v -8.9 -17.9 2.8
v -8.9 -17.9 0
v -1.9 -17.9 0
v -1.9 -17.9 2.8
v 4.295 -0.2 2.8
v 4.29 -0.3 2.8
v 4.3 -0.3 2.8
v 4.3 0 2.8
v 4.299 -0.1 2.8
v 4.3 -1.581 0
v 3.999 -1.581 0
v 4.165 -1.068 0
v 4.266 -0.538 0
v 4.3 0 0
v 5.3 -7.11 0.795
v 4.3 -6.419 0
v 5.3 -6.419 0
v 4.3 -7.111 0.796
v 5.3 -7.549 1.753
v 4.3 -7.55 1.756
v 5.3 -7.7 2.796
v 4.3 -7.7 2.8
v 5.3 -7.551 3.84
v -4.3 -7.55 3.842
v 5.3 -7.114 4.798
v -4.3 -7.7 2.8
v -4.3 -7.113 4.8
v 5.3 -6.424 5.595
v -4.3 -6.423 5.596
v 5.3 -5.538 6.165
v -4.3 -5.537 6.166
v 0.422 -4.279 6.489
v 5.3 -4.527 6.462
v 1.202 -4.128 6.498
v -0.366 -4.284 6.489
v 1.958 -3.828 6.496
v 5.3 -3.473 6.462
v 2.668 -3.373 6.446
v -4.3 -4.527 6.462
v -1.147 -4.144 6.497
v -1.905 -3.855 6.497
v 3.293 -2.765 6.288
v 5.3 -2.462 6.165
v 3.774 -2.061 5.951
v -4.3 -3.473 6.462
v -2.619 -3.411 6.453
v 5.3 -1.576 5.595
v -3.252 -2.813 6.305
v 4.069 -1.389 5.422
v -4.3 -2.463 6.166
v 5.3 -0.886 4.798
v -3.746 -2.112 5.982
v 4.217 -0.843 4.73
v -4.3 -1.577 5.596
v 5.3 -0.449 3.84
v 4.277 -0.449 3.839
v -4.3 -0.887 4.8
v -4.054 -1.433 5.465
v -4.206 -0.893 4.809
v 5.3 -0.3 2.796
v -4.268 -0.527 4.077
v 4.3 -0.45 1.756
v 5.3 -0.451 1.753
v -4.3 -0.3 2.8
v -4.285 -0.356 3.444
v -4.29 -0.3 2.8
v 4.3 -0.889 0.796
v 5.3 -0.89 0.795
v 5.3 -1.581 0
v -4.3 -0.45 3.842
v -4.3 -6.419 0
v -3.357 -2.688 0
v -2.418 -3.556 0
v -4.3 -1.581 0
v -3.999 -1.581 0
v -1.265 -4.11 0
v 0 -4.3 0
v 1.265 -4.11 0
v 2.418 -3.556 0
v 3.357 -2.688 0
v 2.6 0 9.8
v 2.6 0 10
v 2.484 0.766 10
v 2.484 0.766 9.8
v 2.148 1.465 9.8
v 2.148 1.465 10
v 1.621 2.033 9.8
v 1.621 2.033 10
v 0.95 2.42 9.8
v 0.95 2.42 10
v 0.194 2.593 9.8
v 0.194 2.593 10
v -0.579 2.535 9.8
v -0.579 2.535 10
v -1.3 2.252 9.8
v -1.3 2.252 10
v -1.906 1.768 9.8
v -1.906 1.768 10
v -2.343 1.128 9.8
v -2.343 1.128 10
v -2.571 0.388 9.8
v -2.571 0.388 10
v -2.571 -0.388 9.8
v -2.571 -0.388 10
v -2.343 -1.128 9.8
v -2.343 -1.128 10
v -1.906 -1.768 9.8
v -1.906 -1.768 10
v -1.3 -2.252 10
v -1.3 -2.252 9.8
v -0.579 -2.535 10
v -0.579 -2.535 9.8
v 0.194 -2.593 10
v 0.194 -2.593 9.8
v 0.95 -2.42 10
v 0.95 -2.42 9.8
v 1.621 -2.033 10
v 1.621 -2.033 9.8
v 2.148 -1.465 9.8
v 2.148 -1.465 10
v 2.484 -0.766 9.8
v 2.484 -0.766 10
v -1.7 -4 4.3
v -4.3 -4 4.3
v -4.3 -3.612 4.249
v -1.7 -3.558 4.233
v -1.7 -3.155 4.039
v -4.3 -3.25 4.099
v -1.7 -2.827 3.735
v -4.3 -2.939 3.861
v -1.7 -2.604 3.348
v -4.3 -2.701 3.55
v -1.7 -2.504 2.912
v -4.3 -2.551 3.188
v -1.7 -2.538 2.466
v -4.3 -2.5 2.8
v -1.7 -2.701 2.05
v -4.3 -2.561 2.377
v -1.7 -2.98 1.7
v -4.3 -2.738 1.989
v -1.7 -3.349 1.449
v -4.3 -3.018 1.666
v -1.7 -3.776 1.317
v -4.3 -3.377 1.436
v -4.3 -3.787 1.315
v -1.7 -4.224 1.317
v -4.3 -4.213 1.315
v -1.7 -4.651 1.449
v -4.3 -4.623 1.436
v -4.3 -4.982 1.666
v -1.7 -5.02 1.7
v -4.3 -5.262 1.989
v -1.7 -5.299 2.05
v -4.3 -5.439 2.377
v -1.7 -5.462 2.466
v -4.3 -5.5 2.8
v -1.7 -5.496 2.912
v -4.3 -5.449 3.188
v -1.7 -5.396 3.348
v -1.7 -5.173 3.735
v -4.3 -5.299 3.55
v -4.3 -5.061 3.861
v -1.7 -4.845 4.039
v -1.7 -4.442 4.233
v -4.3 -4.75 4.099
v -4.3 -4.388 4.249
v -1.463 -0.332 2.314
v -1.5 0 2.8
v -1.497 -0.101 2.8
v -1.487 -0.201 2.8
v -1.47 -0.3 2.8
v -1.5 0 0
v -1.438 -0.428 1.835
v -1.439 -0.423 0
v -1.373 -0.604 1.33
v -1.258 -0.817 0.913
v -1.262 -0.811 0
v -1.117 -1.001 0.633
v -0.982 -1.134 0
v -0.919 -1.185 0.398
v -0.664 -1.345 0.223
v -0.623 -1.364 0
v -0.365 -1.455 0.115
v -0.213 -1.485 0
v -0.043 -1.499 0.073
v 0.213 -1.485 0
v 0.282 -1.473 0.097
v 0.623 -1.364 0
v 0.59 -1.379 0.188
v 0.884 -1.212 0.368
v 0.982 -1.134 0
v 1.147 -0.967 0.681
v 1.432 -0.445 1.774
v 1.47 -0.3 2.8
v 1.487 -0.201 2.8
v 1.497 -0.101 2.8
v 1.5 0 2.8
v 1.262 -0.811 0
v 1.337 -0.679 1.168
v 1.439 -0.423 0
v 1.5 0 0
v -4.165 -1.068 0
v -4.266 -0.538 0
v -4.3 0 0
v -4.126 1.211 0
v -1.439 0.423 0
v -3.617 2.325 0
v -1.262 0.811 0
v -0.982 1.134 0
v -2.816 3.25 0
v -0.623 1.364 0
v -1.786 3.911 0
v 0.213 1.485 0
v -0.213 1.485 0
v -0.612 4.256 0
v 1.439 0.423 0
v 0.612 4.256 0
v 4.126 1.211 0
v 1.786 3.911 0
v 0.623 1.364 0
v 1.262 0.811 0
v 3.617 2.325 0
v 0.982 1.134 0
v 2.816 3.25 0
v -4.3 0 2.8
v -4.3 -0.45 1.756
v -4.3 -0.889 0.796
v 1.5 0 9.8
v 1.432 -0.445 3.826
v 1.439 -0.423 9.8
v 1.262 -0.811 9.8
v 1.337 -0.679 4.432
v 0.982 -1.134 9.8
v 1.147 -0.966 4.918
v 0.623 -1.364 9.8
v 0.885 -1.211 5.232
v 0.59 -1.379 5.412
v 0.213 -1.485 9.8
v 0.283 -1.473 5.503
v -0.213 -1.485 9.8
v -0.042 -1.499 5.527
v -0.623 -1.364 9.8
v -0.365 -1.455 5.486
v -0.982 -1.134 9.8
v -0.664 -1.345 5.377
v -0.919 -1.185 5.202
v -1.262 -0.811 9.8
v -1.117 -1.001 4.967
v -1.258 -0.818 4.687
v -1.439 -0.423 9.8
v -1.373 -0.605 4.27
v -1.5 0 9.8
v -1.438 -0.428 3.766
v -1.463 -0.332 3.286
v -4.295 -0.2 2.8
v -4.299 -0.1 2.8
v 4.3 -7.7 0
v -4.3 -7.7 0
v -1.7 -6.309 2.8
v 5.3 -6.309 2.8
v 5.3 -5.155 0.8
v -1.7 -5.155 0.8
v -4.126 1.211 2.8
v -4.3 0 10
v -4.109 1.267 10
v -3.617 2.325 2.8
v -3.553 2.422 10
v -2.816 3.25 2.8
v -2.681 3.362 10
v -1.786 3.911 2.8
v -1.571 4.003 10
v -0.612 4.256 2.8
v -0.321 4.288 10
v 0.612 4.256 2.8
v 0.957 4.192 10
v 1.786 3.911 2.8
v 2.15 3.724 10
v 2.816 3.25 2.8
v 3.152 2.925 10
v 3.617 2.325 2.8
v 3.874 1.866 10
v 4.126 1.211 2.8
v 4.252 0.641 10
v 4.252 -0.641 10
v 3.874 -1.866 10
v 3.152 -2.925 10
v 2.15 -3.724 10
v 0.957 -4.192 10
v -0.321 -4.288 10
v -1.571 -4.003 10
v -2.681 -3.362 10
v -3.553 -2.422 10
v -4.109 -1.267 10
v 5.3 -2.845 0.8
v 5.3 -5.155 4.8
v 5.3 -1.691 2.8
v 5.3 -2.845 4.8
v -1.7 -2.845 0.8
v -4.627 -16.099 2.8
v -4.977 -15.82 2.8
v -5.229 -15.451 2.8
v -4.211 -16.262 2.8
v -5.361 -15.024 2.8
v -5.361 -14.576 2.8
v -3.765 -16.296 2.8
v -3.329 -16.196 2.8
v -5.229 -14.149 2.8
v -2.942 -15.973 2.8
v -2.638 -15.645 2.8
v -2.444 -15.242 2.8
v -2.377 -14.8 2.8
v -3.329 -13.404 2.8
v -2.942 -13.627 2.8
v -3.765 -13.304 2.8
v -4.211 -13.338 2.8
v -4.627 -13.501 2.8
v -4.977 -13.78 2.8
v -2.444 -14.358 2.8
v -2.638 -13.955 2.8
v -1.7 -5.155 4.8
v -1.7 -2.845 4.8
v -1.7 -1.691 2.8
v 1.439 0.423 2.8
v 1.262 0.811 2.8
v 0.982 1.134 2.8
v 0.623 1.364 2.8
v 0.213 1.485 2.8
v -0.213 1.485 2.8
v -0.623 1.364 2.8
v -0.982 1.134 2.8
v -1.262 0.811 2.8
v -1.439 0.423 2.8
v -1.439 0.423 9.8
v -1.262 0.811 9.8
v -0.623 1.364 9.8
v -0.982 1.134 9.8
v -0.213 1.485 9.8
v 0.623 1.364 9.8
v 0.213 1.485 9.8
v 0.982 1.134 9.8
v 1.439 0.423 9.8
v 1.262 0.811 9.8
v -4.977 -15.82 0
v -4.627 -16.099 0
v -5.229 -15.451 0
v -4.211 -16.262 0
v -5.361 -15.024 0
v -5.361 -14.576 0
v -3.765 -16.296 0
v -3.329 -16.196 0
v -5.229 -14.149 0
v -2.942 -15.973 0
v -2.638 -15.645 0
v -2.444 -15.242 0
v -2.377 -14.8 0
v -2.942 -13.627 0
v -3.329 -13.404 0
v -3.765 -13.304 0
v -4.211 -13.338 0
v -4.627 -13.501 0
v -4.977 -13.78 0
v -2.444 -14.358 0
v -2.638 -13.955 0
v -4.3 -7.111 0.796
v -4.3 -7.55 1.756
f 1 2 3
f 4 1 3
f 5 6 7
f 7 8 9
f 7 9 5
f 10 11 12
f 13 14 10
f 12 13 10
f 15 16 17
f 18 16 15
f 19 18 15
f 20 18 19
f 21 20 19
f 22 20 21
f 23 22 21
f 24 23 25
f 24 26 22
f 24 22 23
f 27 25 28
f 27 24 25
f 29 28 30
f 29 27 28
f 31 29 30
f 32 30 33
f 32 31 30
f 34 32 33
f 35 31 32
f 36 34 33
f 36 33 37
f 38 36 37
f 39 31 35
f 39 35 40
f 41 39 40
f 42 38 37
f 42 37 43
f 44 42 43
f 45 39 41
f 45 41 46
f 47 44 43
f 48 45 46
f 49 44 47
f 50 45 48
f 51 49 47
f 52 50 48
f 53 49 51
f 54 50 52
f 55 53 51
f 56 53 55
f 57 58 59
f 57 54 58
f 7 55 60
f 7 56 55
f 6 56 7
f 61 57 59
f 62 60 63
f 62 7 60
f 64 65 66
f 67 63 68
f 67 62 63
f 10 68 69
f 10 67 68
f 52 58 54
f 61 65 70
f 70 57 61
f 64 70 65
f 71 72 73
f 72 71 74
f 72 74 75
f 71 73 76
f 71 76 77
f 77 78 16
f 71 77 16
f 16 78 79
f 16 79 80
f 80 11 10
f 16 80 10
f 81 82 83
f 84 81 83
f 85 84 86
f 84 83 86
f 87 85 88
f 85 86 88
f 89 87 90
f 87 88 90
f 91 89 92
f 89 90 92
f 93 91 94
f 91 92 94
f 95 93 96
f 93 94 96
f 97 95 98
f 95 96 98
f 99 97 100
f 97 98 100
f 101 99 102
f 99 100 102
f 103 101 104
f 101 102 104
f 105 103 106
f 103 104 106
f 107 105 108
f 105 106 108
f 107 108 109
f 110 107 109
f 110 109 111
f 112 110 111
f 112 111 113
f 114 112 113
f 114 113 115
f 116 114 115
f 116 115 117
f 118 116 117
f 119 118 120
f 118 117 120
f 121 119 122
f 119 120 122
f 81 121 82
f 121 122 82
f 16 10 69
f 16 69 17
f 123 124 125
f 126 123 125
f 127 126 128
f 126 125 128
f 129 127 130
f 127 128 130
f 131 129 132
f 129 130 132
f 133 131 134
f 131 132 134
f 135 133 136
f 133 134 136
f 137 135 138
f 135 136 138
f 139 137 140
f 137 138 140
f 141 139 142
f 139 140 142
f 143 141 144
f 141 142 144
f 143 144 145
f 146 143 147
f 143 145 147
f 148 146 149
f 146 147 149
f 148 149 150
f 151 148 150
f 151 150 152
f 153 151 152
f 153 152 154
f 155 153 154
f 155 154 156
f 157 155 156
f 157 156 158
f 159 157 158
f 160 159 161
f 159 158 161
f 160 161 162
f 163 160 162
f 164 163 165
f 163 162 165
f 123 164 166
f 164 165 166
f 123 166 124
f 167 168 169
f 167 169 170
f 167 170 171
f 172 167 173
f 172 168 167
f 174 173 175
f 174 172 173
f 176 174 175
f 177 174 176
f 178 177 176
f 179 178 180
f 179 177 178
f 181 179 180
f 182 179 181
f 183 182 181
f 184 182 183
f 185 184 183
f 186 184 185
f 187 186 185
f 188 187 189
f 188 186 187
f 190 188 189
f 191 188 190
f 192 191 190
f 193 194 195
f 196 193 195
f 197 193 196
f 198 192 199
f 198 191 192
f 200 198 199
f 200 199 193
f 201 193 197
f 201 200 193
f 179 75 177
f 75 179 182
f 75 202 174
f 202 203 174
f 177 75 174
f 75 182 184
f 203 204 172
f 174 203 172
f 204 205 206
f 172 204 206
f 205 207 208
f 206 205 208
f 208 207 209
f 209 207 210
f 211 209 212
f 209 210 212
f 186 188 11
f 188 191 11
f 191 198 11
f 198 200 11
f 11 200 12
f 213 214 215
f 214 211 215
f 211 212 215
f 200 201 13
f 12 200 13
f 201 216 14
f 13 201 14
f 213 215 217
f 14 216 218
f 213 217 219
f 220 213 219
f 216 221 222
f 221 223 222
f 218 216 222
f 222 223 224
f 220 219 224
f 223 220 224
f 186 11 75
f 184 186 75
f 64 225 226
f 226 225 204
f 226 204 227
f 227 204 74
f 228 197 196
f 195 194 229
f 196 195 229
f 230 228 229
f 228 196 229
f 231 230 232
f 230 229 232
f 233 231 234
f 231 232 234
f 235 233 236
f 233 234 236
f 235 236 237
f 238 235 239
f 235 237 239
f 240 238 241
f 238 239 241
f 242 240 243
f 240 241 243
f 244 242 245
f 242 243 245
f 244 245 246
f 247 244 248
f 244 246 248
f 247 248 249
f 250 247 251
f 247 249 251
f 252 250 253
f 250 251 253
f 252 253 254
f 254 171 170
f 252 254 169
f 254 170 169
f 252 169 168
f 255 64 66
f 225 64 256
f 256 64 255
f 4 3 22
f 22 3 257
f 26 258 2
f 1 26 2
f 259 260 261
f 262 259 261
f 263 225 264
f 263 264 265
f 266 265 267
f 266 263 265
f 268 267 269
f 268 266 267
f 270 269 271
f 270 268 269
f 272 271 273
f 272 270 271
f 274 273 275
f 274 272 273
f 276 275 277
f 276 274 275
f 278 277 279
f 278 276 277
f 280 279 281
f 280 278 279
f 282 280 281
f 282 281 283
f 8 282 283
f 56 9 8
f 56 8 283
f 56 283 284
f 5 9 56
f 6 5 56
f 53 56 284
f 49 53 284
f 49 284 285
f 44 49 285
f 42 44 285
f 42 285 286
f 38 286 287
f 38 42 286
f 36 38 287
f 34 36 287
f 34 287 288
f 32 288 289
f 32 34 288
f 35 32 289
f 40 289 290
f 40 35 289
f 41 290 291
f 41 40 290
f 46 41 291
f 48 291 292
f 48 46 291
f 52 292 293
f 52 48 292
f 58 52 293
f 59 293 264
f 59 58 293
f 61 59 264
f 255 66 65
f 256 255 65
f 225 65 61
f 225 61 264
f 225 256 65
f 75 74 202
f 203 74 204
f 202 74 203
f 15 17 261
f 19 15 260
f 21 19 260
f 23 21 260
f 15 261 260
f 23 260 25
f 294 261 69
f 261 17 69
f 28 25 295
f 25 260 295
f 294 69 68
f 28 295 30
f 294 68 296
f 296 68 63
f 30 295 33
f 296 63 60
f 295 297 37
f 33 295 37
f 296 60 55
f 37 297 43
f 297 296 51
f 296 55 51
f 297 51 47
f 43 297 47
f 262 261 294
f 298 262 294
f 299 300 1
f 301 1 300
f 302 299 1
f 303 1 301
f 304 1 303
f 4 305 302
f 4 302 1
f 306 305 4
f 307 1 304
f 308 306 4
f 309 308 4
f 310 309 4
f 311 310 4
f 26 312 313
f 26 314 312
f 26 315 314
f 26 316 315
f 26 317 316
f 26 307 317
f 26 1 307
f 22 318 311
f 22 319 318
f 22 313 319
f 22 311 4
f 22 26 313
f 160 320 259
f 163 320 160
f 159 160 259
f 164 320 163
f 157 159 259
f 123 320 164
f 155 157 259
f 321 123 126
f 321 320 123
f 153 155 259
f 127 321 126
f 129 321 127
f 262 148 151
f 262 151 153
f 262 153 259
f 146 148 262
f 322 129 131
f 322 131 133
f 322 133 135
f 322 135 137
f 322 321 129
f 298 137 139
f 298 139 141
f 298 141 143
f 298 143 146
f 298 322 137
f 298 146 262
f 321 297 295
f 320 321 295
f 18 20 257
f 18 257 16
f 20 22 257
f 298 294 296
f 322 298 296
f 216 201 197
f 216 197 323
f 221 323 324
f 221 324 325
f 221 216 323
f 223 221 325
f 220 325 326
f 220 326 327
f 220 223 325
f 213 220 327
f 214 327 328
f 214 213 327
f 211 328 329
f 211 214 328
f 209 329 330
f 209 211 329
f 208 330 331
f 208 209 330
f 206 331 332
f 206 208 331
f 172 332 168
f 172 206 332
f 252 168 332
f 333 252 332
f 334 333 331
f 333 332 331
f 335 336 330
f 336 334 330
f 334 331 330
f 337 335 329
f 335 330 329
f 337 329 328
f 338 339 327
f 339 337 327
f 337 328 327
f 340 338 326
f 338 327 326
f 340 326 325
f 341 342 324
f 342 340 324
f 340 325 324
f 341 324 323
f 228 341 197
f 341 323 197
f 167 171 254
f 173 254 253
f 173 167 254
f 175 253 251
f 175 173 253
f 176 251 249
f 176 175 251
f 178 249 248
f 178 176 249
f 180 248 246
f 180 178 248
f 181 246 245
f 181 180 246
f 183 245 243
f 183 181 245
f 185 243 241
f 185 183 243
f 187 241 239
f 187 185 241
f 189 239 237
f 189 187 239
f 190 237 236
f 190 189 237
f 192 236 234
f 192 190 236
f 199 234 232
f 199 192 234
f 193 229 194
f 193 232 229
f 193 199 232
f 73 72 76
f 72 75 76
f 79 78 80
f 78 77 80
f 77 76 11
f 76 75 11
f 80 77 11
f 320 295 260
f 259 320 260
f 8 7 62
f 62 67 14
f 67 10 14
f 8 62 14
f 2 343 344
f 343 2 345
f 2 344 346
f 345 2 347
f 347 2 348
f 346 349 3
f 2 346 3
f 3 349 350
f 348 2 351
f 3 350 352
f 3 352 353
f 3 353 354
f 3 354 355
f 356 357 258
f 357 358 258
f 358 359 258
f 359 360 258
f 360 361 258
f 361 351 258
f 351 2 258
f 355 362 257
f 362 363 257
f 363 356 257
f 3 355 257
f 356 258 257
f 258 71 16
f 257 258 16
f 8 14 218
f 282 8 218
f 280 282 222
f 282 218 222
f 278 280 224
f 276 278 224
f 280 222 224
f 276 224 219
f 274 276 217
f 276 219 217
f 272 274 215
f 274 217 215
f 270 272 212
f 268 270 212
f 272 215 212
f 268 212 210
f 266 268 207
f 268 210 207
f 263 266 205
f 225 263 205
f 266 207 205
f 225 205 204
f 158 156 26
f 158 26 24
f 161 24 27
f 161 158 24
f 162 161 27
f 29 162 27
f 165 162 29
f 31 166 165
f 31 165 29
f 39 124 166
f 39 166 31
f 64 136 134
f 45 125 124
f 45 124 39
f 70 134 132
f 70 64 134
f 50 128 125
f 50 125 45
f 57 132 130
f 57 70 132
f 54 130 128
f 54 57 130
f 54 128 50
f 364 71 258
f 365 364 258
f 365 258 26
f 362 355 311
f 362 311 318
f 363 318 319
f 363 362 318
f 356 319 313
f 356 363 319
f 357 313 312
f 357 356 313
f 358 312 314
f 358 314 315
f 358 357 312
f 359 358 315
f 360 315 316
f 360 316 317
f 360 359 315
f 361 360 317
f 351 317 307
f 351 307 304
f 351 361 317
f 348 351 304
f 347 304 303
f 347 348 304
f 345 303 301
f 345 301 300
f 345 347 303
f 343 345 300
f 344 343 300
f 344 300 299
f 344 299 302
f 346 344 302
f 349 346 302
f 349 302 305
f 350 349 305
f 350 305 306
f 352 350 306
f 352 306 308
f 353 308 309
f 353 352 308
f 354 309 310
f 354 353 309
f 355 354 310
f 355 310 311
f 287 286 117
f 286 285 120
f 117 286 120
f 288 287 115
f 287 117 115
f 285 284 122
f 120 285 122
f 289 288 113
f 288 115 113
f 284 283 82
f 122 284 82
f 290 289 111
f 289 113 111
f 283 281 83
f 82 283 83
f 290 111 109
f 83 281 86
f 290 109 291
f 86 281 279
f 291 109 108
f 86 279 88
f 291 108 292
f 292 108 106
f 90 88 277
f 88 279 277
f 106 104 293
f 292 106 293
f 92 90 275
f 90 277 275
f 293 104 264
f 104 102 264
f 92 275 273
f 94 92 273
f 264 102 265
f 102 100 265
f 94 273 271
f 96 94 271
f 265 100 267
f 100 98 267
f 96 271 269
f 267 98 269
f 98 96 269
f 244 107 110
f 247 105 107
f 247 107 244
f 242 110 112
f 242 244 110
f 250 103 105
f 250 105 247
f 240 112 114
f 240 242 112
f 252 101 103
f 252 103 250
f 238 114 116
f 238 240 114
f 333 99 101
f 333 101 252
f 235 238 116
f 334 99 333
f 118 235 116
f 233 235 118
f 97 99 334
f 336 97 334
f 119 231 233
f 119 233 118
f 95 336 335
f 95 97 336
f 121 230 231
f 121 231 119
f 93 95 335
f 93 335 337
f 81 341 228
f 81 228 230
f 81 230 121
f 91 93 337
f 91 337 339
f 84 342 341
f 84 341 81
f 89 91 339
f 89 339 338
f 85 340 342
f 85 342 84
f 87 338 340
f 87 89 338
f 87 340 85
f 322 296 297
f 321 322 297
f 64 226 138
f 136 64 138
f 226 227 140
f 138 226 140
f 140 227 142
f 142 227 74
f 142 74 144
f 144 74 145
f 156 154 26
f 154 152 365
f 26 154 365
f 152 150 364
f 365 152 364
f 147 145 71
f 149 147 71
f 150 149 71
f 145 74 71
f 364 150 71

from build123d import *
from build123d.topology import SkipClean

# Parameters (mm, degrees)
SKETCH_1_R          = 1.5
EXTRUDE_1_DEPTH     = 2.8
SKETCH_3_R          = 4.3
SKETCH_3_R_2        = 1.5
EXTRUDE_4_DEPTH     = 10
CUT_EXTRUDE_START   = -0.2
SKETCH_4_R          = 2.6
SKETCH_4_R_2        = 1.5
CUT_EXTRUDE_1_DEPTH = 0.2
EXTRUDE_8_DEPTH     = 9.6
CUT_EXTRUDE_2_DEPTH = 7
SKETCH_19_R         = 1.5
CUT_EXTRUDE_3_DEPTH = 23.64000892
SKETCH_1_4_R        = 1.5
CUT_EXTRUDE_4_DEPTH = 23.352181146


with BuildPart() as part:
    # 草图1 → 凸台-拉伸1 (new body)
    with BuildSketch(Plane.XY):
        with BuildLine():
            Line((4.3, -7.7), (4.3, 0))
            ThreePointArc((4.3, 0), (0, 4.3), (-4.3, 0))
            Line((-4.3, 0), (-4.3, -7.7))
            Line((-4.3, -7.7), (-8.9, -17.9))
            Line((-8.9, -17.9), (-1.9, -17.9))
            Line((-1.9, -17.9), (4.3, -7.7))
        make_face()
        Circle(SKETCH_1_R, mode=Mode.SUBTRACT)
        with Locations((-3.877494661, -14.8)):
            Circle(SKETCH_1_R, mode=Mode.SUBTRACT)
    extrude(amount=EXTRUDE_1_DEPTH)

    # 草图3 → 凸台-拉伸4 (add)
    with SkipClean():  # the faces are left unmerged after this step: merging them gives an invalid solid
        with BuildSketch(Plane(origin=(0, 0, 0), x_dir=(-1, 0, 0), z_dir=(0, 0, -1))):
            Circle(SKETCH_3_R)
            Circle(SKETCH_3_R_2, mode=Mode.SUBTRACT)
        extrude(amount=-EXTRUDE_4_DEPTH)

    # 草图4 → 切除-拉伸1 (cut)
    with SkipClean():  # the faces are left unmerged after this step: merging them gives an invalid solid
        with BuildSketch(Plane.XY.offset(10).offset(CUT_EXTRUDE_START)):
            Circle(SKETCH_4_R)
            Circle(SKETCH_4_R_2, mode=Mode.SUBTRACT)
        extrude(amount=CUT_EXTRUDE_1_DEPTH, mode=Mode.SUBTRACT)

    # 草图17 → 凸台-拉伸8 (add)
    with SkipClean():  # the faces are left unmerged after this step: merging them gives an invalid solid
        with BuildSketch(Plane.ZY.offset(4.3)):
            with BuildLine():
                Line((0, -1.581322676), (0, -6.418677324))
                ThreePointArc((0, -6.418677324), (6.5, -4), (0, -1.581322676))
            make_face()
        extrude(amount=-EXTRUDE_8_DEPTH)

    # 草图18 → 切除-拉伸2 (cut)
    with SkipClean():  # the faces are left unmerged after this step: merging them gives an invalid solid
        with BuildSketch(Plane(origin=(5.3, 0, 0), x_dir=(0, 0, -1), z_dir=(1, 0, 0))):
            Polygon((-0.8, -5.154700538), (-0.8, -2.845299462), (-2.8, -1.690598923), (-4.8, -2.845299462), (-4.8, -5.154700538), (-2.8, -6.309401077), align=None)
        extrude(amount=-CUT_EXTRUDE_2_DEPTH, mode=Mode.SUBTRACT)

    # 草图19 → 切除-拉伸3 (cut, through all)
    with SkipClean():  # the faces are left unmerged after this step: merging them gives an invalid solid
        with BuildSketch(Plane.ZY.offset(4.3)):
            with Locations((2.8, -4)):
                Circle(SKETCH_19_R)
        extrude(amount=-CUT_EXTRUDE_3_DEPTH, mode=Mode.SUBTRACT)

    # 草图1<4> → 切除-拉伸4 (cut, through all)
    with SkipClean():  # the faces are left unmerged after this step: merging them gives an invalid solid
        with BuildSketch(Plane.XY):
            Circle(SKETCH_1_4_R)
        extrude(amount=CUT_EXTRUDE_4_DEPTH, mode=Mode.SUBTRACT)


solid = part.part
